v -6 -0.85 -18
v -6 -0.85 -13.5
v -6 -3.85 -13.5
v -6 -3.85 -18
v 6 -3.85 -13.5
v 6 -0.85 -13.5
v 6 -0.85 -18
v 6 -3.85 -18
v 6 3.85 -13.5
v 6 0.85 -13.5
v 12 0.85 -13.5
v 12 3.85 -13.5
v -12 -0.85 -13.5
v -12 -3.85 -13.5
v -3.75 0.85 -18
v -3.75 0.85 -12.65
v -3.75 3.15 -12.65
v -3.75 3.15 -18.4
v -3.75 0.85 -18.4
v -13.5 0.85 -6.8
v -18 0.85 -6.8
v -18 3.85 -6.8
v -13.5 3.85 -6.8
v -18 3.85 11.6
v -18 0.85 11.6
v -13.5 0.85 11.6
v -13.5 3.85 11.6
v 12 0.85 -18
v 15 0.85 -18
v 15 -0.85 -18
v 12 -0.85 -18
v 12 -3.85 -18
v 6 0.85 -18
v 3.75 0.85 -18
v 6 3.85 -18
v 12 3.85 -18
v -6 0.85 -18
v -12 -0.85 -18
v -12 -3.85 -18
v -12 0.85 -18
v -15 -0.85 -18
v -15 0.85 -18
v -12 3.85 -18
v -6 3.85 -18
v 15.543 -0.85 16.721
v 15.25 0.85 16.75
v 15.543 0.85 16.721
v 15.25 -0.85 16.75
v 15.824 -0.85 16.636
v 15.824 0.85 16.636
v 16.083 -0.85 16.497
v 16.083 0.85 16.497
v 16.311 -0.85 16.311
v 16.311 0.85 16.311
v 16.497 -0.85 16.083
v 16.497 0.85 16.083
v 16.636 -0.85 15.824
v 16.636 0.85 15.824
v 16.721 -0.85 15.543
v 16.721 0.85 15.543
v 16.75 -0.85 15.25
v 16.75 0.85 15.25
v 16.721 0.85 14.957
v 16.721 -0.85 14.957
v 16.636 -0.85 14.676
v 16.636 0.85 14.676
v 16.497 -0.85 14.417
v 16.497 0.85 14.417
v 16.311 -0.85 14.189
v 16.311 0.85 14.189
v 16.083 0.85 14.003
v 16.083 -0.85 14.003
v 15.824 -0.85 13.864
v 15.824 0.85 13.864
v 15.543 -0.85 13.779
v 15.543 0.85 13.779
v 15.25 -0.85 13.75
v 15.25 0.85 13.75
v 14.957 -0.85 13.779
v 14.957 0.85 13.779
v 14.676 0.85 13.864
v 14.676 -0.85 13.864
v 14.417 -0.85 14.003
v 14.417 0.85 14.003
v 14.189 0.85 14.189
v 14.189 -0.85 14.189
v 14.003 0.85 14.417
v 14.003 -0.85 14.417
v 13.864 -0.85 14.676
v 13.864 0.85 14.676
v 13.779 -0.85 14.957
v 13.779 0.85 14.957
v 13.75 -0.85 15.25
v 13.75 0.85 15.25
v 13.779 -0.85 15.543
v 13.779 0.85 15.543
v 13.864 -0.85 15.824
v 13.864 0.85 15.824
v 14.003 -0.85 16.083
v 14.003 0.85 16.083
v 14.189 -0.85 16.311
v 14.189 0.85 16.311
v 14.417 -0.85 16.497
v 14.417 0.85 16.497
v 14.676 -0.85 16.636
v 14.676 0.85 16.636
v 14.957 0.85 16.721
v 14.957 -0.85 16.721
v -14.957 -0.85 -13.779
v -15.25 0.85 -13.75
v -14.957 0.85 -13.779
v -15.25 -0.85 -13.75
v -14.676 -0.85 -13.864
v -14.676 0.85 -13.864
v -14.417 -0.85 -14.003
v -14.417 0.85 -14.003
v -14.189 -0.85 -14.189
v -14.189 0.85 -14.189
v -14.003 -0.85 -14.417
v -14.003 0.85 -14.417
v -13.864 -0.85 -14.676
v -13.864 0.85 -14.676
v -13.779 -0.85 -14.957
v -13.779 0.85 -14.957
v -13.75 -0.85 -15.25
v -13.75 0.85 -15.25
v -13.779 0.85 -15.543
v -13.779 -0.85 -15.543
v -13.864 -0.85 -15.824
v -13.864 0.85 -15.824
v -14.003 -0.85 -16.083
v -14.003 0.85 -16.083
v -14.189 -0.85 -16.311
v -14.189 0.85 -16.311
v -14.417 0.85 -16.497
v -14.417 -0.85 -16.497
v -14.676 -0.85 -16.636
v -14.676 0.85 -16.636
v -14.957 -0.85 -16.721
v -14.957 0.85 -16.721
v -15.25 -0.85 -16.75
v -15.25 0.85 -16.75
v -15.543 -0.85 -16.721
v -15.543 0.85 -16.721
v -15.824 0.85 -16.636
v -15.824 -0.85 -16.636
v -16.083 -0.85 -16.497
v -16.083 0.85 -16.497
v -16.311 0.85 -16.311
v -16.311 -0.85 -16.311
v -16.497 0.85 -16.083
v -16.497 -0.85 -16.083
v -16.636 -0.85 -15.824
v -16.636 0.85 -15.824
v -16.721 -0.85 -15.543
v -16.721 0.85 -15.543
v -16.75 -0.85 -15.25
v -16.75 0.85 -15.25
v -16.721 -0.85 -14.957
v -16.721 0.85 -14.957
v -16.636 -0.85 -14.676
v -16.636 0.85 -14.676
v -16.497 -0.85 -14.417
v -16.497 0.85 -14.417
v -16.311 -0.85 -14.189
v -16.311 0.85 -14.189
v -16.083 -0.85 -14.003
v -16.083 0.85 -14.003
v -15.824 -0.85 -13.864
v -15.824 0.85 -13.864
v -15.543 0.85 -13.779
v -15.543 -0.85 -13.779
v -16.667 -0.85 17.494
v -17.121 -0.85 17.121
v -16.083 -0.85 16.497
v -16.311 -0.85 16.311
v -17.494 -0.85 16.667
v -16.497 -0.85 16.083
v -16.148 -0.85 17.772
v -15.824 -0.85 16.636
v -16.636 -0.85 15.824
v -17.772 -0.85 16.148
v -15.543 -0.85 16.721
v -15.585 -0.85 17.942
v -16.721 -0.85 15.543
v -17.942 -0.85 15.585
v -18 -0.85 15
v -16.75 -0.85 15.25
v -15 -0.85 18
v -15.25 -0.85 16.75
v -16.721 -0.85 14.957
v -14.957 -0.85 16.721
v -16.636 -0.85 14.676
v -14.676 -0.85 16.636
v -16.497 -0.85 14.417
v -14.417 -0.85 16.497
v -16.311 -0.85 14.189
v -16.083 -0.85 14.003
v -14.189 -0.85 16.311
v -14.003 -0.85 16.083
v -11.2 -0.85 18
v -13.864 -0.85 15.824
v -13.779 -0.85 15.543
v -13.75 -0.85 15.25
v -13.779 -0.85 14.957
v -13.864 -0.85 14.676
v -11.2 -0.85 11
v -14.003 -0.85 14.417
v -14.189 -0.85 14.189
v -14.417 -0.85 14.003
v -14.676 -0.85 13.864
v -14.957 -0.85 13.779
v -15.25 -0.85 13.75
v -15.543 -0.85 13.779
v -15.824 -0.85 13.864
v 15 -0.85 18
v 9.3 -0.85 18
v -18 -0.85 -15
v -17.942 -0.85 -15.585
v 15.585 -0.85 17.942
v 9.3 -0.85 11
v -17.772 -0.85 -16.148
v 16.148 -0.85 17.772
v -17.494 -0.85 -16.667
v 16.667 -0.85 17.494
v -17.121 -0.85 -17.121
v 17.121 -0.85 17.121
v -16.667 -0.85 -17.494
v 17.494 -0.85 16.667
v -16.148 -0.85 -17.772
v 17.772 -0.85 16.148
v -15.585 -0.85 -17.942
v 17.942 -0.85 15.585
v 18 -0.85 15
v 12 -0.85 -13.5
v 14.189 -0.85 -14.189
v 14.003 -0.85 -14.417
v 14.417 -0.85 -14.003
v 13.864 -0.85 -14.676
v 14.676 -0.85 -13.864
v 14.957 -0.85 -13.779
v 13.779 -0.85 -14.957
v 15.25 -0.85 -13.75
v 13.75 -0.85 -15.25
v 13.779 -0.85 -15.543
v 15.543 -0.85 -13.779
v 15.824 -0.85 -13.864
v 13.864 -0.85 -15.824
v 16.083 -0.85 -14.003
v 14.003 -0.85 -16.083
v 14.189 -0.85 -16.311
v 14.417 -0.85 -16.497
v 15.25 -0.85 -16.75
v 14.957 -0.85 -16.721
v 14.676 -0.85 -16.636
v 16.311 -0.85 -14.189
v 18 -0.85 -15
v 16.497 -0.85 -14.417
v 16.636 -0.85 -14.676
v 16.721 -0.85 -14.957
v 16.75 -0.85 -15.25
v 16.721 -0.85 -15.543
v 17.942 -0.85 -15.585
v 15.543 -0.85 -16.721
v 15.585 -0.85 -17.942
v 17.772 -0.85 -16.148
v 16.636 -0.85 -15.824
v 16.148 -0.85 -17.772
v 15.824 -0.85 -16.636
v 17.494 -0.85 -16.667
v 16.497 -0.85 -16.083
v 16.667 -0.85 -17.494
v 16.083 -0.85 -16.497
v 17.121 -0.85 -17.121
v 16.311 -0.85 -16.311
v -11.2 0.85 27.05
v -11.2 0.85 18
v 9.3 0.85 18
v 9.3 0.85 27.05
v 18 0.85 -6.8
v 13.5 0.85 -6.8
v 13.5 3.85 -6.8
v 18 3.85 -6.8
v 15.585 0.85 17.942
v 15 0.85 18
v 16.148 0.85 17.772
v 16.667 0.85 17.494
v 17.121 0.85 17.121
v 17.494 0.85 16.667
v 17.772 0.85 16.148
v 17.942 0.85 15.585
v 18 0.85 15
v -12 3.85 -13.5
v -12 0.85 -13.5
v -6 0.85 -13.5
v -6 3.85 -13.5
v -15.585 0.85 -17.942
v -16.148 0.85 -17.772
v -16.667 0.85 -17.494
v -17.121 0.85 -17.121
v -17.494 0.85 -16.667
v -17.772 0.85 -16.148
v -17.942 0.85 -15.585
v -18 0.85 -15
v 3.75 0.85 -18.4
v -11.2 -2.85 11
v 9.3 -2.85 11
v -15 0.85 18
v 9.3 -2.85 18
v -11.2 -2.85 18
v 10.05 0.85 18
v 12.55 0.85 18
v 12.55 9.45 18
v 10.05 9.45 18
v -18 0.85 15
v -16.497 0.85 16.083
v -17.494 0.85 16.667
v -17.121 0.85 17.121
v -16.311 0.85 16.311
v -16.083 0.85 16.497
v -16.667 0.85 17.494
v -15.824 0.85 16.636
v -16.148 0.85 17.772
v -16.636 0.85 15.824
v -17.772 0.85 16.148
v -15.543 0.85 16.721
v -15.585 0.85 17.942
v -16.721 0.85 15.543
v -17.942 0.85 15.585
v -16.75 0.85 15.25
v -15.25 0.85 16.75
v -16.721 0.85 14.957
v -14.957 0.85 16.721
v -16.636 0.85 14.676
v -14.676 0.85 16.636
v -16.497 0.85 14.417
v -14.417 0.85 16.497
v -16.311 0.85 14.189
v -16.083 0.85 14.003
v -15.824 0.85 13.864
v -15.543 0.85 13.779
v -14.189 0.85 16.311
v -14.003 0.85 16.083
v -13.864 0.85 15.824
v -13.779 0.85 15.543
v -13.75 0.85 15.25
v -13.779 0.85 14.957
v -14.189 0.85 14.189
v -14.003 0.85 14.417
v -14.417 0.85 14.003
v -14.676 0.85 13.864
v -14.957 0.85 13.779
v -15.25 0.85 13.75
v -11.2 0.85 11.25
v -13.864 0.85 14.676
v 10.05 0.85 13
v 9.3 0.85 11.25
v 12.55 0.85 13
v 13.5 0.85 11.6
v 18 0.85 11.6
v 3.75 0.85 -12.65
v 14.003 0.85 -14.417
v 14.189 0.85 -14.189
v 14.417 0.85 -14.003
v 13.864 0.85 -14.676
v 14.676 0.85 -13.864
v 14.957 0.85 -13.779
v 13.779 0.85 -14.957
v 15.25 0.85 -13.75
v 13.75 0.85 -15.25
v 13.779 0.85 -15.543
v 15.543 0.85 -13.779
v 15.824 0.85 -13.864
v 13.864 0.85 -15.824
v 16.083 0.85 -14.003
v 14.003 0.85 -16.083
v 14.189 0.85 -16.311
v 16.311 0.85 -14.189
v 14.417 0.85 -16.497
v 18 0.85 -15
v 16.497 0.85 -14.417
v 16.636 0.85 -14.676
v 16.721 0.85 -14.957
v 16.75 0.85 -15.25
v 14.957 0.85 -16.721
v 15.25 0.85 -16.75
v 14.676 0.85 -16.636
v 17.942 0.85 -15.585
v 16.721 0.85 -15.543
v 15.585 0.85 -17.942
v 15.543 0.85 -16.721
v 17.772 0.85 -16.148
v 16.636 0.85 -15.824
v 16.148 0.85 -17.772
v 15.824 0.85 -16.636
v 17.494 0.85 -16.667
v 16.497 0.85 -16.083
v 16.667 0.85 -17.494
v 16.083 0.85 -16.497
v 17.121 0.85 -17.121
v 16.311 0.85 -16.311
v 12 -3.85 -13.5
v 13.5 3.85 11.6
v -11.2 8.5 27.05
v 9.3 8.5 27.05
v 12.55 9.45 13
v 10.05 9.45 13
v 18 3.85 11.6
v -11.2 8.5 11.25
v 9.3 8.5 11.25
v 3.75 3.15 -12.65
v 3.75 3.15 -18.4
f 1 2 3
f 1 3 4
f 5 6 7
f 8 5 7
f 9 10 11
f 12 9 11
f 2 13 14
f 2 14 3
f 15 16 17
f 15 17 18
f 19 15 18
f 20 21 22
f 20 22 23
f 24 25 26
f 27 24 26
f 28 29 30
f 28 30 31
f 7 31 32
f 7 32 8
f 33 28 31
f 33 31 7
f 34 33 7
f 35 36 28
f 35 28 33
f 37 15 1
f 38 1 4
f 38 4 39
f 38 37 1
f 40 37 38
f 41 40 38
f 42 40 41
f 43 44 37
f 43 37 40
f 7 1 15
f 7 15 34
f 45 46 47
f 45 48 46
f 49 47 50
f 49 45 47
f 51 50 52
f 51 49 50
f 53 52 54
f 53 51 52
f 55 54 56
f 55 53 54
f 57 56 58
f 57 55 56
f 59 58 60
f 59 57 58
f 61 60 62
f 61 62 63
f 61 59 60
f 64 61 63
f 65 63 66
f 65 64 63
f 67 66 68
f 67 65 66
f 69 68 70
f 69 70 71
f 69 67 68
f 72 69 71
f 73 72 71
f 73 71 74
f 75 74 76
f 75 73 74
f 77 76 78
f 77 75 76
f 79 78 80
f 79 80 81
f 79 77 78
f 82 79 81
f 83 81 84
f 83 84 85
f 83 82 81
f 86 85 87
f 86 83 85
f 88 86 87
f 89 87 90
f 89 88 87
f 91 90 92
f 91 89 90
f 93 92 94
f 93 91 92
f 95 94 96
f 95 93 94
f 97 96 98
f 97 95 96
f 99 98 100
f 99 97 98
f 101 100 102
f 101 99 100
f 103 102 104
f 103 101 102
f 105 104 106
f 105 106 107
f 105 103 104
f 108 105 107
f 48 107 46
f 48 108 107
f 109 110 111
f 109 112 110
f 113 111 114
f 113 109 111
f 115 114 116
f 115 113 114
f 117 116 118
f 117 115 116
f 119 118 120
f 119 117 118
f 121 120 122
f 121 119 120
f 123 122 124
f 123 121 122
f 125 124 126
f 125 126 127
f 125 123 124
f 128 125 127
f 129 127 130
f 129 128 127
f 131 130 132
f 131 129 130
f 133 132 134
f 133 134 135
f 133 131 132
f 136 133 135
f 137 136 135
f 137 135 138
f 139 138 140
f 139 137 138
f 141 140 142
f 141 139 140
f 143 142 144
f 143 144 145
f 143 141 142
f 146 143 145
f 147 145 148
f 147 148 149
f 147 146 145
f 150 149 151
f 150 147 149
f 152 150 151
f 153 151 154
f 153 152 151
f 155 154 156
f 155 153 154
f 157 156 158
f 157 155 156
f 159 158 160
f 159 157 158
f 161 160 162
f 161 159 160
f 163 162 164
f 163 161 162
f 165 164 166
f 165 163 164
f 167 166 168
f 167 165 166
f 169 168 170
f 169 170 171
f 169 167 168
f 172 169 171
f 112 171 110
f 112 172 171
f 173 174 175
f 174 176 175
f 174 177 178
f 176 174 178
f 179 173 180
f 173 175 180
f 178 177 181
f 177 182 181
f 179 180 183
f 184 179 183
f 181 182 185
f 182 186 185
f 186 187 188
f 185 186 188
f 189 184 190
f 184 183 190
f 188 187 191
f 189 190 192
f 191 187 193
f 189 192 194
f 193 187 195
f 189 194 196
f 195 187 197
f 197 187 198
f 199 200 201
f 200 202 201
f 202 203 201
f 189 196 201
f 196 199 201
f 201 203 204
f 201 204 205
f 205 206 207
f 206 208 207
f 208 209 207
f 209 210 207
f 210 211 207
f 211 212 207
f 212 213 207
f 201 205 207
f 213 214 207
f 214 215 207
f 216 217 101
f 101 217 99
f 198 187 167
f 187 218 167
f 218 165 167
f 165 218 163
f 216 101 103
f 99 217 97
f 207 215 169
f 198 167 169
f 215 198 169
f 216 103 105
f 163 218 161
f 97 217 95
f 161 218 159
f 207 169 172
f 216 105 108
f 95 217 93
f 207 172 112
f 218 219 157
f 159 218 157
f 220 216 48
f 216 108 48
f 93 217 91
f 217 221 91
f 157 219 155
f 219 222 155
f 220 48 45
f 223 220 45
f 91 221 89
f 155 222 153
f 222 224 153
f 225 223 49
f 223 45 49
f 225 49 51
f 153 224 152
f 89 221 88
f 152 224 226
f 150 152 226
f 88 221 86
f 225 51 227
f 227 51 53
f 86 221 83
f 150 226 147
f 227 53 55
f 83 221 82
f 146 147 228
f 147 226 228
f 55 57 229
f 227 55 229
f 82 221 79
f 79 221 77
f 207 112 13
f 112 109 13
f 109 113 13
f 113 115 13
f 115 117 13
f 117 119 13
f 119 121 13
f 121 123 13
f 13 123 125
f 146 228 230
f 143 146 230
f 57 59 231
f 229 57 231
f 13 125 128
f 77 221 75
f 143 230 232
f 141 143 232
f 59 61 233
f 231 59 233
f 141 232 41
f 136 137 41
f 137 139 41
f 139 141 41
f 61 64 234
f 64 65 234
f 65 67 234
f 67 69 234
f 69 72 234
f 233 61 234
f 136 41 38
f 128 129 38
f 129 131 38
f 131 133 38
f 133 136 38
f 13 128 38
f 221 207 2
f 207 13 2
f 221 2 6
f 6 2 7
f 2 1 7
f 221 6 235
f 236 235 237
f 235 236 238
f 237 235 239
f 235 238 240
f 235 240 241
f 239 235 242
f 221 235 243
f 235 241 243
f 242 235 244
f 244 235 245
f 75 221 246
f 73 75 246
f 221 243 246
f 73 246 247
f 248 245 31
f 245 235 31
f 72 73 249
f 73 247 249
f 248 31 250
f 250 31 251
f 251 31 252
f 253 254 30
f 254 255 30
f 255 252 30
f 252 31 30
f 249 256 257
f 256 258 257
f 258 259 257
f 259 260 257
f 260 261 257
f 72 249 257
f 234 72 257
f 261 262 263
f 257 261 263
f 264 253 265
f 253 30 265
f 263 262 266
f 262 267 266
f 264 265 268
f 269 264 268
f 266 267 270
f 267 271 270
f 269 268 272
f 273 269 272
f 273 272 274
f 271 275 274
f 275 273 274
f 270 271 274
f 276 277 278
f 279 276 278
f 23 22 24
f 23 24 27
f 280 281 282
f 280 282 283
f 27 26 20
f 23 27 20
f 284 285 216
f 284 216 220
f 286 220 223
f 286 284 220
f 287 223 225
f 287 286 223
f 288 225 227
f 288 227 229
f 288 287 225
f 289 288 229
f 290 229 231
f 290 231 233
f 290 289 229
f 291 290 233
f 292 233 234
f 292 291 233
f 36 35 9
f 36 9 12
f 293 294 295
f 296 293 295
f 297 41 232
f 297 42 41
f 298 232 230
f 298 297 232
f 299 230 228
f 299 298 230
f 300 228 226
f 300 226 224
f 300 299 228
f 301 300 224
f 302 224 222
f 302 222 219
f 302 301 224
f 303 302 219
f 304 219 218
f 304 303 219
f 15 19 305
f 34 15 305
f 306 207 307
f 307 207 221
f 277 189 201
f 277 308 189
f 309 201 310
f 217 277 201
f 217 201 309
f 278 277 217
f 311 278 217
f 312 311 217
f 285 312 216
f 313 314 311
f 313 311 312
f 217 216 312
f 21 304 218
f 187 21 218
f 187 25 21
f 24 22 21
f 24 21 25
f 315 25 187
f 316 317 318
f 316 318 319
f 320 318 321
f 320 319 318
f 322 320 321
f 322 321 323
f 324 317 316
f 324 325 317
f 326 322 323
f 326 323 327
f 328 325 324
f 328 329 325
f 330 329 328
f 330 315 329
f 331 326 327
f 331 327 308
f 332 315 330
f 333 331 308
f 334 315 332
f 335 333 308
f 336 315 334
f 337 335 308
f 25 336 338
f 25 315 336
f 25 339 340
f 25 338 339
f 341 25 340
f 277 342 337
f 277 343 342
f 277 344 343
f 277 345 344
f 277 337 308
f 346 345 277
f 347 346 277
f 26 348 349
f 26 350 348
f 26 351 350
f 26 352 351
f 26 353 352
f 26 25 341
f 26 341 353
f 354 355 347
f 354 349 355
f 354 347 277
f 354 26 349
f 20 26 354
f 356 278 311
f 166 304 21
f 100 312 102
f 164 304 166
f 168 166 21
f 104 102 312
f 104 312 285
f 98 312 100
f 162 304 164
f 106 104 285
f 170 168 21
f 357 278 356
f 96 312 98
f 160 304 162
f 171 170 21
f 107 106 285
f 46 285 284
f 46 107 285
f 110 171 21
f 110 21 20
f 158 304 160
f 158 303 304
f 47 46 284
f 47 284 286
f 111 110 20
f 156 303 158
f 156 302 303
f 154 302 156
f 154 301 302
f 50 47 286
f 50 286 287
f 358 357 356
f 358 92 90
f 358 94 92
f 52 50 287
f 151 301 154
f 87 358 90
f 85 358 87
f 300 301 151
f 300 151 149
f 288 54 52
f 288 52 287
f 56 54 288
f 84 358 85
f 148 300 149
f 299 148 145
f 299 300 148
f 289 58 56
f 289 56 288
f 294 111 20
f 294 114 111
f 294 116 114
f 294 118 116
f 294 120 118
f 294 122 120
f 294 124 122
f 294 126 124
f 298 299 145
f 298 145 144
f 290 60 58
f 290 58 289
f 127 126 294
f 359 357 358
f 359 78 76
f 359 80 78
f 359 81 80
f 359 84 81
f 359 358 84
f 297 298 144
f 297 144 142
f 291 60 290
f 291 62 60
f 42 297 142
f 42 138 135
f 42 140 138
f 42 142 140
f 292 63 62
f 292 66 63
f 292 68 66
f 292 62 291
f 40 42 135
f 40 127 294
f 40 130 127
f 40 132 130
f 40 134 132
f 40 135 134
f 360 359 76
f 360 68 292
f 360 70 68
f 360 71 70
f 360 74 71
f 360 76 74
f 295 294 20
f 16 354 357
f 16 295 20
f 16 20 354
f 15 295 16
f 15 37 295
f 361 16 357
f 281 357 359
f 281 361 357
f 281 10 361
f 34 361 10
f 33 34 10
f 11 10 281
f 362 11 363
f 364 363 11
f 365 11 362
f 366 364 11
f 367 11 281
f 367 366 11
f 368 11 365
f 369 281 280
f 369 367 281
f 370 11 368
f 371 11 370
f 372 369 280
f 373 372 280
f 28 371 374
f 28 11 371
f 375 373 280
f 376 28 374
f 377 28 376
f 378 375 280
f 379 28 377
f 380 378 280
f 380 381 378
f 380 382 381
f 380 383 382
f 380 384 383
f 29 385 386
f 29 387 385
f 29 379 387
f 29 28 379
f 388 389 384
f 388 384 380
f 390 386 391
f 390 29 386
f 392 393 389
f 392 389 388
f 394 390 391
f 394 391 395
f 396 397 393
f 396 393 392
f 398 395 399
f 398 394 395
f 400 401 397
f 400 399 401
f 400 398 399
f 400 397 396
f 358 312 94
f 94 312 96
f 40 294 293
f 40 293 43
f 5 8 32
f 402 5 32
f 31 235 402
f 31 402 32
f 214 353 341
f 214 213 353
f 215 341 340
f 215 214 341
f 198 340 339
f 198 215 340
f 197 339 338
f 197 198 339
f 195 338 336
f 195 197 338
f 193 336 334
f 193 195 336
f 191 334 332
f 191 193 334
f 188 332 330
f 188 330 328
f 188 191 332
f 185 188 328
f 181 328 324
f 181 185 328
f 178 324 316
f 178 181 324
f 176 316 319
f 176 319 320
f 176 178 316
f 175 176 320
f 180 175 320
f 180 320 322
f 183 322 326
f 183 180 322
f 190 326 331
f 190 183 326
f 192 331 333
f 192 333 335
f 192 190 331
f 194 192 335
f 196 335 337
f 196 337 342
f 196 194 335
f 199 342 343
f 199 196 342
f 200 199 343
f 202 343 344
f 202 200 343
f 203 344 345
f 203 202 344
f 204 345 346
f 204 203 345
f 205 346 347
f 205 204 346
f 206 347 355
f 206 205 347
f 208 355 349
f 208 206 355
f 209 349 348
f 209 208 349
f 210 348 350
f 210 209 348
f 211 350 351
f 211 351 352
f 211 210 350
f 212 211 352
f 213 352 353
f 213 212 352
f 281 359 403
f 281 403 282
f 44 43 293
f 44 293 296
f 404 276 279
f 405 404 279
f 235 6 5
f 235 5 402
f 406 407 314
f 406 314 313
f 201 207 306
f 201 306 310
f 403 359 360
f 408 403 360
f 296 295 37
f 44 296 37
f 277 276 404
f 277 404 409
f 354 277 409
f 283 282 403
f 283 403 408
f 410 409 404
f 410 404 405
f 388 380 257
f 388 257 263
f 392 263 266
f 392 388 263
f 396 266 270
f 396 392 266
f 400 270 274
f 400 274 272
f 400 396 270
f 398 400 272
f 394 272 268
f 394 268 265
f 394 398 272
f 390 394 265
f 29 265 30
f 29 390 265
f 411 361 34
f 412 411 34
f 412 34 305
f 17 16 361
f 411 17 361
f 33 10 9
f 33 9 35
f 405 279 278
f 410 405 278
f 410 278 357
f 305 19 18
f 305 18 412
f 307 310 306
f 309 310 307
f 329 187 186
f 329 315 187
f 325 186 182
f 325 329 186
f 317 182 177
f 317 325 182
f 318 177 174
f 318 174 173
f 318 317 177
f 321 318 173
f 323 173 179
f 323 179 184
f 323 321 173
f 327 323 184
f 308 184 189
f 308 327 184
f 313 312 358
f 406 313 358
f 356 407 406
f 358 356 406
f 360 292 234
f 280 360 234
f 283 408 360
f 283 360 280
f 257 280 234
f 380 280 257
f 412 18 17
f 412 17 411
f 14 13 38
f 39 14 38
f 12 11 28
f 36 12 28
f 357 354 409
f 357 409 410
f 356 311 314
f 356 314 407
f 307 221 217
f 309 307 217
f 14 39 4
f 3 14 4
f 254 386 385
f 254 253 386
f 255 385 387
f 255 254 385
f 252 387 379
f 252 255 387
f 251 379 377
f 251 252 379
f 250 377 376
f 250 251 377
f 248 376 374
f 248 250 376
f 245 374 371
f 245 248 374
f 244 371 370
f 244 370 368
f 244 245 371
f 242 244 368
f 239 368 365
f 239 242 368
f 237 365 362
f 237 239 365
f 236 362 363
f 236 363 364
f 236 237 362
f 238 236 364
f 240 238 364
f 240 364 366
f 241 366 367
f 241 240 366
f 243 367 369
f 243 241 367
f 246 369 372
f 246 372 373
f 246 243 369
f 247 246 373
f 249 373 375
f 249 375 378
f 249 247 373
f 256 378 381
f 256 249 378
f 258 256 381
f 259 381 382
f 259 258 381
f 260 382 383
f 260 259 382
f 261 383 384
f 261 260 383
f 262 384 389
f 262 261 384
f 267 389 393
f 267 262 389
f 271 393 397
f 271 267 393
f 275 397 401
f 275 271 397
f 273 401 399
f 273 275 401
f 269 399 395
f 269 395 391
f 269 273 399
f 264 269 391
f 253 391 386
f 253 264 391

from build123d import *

# Parameters (mm, degrees)
SKETCH1_R           = 1.5
BOSS_EXTRUDE1_DEPTH = 0.85
SKETCH2_W           = 4.5
SKETCH2_H           = 18.4
BOSS_EXTRUDE2_DEPTH = 3
SKETCH3_W           = 6
SKETCH3_H           = 4.5
BOSS_EXTRUDE3_DEPTH = 3
SKETCH4_W           = 7.5
SKETCH4_H           = 5.75
BOSS_EXTRUDE4_DEPTH = 2.3
SKETCH5_W           = 20.5
SKETCH5_H           = 15.8
BOSS_EXTRUDE5_DEPTH = 7.65
SKETCH6_W           = 2.5
SKETCH6_H           = 5
BOSS_EXTRUDE6_DEPTH = 8.6
SKETCH7_W           = 20.5
SKETCH7_H           = 7
BOSS_EXTRUDE7_DEPTH = 2


with BuildPart() as part:
    # Sketch1 → Boss-Extrude1 (new, symmetric)
    with BuildSketch(Plane(origin=(0, 0, 0), x_dir=(1, 0, 0), z_dir=(0, 1, 0))):
        with BuildLine():
            Line((-15, -18), (15, -18))
            ThreePointArc((15, -18), (17.121320344, -17.121320344), (18, -15))
            Line((18, -15), (18, 15))
            ThreePointArc((18, 15), (17.121320344, 17.121320344), (15, 18))
            Line((15, 18), (-15, 18))
            ThreePointArc((-15, 18), (-17.121320344, 17.121320344), (-18, 15))
            Line((-18, 15), (-18, -15))
            ThreePointArc((-18, -15), (-17.121320344, -17.121320344), (-15, -18))
        make_face()
        with Locations(Location((-15.25, 15.25, 0), (0, 0, 270))):
            Circle(SKETCH1_R, mode=Mode.SUBTRACT)
        with Locations(Location((15.25, 15.25, 0), (0, 0, 90))):
            Circle(SKETCH1_R, mode=Mode.SUBTRACT)
        with Locations(Location((15.25, -15.25, 0), (0, 0, 270))):
            Circle(SKETCH1_R, mode=Mode.SUBTRACT)
        with Locations(Location((-15.25, -15.25, 0), (0, 0, 90))):
            Circle(SKETCH1_R, mode=Mode.SUBTRACT)
    extrude(amount=BOSS_EXTRUDE1_DEPTH, both=True)

    # Sketch2 → Boss-Extrude2 (add)
    with BuildSketch(Plane(origin=(0, 0.85, 0), x_dir=(1, 0, 0), z_dir=(0, 1, 0))):
        with Locations((-15.75, -2.4)):
            Rectangle(SKETCH2_W, SKETCH2_H)
        with Locations((15.75, -2.4)):
            Rectangle(SKETCH2_W, SKETCH2_H)
    extrude(amount=BOSS_EXTRUDE2_DEPTH)

    # Sketch3 → Boss-Extrude3 (add)
    with BuildSketch(Plane(origin=(0, 0.85, 0), x_dir=(1, 0, 0), z_dir=(0, 1, 0))):
        with Locations((-9, 15.75)):
            Rectangle(SKETCH3_W, SKETCH3_H)
        with Locations((9, 15.75)):
            Rectangle(SKETCH3_W, SKETCH3_H)
    boss_extrude3 = extrude(amount=BOSS_EXTRUDE3_DEPTH)

    # Mirror2: Boss-Extrude3 across plane
    add(boss_extrude3.mirror(Plane.ZX))

    # Sketch4 → Boss-Extrude4 (add)
    with BuildSketch(Plane(origin=(0, 0.85, 0), x_dir=(1, 0, 0), z_dir=(0, 1, 0))):
        with Locations((0, 15.525)):
            Rectangle(SKETCH4_W, SKETCH4_H)
    extrude(amount=BOSS_EXTRUDE4_DEPTH)

    # Sketch5 → Boss-Extrude5 (add)
    with BuildSketch(Plane(origin=(0, 0.85, 0), x_dir=(1, 0, 0), z_dir=(0, 1, 0))):
        with Locations((-0.95, -19.15)):
            Rectangle(SKETCH5_W, SKETCH5_H)
    extrude(amount=BOSS_EXTRUDE5_DEPTH)

    # Sketch6 → Boss-Extrude6 (add)
    with BuildSketch(Plane(origin=(0, 0.85, 0), x_dir=(1, 0, 0), z_dir=(0, 1, 0))):
        with Locations((11.3, -15.5)):
            Rectangle(SKETCH6_W, SKETCH6_H)
    extrude(amount=BOSS_EXTRUDE6_DEPTH)

    # Sketch7 → Boss-Extrude7 (add)
    with BuildSketch(Plane.XZ.offset(0.85)):
        with Locations((-0.95, 14.5)):
            Rectangle(SKETCH7_W, SKETCH7_H)
    extrude(amount=BOSS_EXTRUDE7_DEPTH)


solid = part.part
